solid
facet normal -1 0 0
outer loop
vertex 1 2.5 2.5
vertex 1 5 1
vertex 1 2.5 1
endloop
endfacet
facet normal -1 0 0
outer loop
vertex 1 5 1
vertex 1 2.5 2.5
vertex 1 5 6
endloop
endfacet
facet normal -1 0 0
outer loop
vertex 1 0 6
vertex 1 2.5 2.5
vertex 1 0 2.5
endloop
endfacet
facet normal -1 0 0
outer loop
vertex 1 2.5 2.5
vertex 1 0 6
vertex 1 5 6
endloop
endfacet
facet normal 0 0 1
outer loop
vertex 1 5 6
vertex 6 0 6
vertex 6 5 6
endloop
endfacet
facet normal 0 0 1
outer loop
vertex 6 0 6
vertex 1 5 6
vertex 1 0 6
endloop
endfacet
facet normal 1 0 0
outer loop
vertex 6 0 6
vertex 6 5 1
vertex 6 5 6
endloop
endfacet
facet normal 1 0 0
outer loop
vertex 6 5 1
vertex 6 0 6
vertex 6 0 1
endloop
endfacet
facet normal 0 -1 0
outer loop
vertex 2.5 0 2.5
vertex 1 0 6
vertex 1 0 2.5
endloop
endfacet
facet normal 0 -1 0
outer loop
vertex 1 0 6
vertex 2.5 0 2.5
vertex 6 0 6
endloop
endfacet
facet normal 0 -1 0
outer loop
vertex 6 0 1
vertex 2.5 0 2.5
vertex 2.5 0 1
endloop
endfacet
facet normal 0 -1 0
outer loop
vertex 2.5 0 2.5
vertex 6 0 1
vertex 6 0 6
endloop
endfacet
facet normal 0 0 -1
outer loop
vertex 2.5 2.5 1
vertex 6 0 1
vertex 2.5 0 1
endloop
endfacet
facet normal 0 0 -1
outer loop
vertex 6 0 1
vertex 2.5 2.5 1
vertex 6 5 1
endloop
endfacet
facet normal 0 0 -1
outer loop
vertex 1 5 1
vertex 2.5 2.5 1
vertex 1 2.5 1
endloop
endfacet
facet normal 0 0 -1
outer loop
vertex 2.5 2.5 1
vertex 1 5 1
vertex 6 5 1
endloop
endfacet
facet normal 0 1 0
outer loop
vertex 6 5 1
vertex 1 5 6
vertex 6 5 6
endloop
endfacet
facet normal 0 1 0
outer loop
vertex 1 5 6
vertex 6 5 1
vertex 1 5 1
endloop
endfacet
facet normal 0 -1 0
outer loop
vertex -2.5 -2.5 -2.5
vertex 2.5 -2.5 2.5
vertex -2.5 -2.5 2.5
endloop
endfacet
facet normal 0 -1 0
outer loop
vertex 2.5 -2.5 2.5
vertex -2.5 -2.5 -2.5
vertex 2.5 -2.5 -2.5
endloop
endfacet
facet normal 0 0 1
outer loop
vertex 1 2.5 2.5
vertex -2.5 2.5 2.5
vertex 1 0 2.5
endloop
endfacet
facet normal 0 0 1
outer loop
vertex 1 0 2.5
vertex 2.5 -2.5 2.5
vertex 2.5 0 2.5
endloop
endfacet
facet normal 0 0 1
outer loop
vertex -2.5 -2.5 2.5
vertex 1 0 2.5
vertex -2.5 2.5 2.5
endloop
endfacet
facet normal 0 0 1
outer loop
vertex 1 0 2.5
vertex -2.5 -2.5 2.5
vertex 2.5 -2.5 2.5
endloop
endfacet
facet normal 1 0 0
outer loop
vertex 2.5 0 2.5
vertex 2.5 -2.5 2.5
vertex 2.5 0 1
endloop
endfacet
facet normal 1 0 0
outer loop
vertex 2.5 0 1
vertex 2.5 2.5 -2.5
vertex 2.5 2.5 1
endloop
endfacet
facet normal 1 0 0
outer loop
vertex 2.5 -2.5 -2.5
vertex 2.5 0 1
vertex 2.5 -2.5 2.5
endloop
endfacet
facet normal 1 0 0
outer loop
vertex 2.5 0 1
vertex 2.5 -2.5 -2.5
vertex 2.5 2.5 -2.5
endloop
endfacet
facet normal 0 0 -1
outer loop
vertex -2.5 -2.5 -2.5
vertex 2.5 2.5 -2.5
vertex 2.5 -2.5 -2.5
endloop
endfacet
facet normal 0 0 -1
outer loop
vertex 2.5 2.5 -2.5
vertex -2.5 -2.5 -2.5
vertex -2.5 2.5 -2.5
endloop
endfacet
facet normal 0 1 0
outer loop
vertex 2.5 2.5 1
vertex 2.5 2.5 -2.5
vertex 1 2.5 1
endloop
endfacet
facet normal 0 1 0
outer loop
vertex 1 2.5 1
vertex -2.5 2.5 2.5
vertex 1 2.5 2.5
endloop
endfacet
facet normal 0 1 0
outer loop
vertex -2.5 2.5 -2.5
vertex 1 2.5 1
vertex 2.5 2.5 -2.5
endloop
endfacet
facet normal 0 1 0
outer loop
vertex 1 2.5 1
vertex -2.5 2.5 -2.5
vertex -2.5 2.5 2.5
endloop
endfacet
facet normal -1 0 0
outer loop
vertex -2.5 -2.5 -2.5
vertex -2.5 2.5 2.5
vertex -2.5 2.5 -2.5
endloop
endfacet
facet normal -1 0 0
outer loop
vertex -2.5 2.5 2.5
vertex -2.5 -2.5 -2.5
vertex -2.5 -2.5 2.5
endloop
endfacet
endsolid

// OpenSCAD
  BBoxDetranslate() {
        translate([1,0,1]) cube(5);
 
 
     
     }
 module BBoxDetranslate(){
          hull()children();
    # scale(.5)
         minkowski(){
            hull() children();
             mirror([1,0,0])      mirror([0,1,0])      mirror([0,0,1])
            hull() children();
         
         }
 }
 
module inset(r,q=20){
  a= generatepoints(q)*r;
//#children();

intersection_for(t=a){
      translate(t ) children();
    }


}


    // unionRound helper expand by r
    module clad(r,q=20) {
        minkowski() {
            children();
            //        icosphere(r,2);
             isosphere(r,q); 
        }
    }
    // unionRound helper
    module shell(r,q) {
        difference() {
            clad(r,q) children();
            children();
        }
    }

 /*    
    // The following is a sphere with some equidistant properties.
    // Not strictly necessary

    Kogan, Jonathan (2017) "A New Computationally Efficient Method for Spacing n Points on a Sphere," Rose-Hulman Undergraduate Mathematics Journal: Vol. 18 : Iss. 2 , Article 5.
    Available at: https://scholar.rose-hulman.edu/rhumj/vol18/iss2/5 */
    
    function sphericalcoordinate(x,y)=  [cos(x  )*cos(y  ), sin(x  )*cos(y  ), sin(y  )];
    function NX(n,x)= 
    let(toDeg=57.2958,PI=acos(-1)/toDeg,
    start=(-1.+1./(n-1.)),increment=(2.-2./(n-1.))/(n-1.) )
    [ for (j= [0:n-1])let (s=start+j*increment )
    sphericalcoordinate(   s*x*toDeg,  PI/2.* sign(s)*(1.-sqrt(1.-abs(s)))*toDeg)];
    function generatepoints(n)= NX(n,0.1+1.2*n);
    module isosphere(r,detail){
    a= generatepoints(detail);
    scale(r)hull()polyhedron(a,[[for(i=[0:len(a)-1])i]]);
    }
